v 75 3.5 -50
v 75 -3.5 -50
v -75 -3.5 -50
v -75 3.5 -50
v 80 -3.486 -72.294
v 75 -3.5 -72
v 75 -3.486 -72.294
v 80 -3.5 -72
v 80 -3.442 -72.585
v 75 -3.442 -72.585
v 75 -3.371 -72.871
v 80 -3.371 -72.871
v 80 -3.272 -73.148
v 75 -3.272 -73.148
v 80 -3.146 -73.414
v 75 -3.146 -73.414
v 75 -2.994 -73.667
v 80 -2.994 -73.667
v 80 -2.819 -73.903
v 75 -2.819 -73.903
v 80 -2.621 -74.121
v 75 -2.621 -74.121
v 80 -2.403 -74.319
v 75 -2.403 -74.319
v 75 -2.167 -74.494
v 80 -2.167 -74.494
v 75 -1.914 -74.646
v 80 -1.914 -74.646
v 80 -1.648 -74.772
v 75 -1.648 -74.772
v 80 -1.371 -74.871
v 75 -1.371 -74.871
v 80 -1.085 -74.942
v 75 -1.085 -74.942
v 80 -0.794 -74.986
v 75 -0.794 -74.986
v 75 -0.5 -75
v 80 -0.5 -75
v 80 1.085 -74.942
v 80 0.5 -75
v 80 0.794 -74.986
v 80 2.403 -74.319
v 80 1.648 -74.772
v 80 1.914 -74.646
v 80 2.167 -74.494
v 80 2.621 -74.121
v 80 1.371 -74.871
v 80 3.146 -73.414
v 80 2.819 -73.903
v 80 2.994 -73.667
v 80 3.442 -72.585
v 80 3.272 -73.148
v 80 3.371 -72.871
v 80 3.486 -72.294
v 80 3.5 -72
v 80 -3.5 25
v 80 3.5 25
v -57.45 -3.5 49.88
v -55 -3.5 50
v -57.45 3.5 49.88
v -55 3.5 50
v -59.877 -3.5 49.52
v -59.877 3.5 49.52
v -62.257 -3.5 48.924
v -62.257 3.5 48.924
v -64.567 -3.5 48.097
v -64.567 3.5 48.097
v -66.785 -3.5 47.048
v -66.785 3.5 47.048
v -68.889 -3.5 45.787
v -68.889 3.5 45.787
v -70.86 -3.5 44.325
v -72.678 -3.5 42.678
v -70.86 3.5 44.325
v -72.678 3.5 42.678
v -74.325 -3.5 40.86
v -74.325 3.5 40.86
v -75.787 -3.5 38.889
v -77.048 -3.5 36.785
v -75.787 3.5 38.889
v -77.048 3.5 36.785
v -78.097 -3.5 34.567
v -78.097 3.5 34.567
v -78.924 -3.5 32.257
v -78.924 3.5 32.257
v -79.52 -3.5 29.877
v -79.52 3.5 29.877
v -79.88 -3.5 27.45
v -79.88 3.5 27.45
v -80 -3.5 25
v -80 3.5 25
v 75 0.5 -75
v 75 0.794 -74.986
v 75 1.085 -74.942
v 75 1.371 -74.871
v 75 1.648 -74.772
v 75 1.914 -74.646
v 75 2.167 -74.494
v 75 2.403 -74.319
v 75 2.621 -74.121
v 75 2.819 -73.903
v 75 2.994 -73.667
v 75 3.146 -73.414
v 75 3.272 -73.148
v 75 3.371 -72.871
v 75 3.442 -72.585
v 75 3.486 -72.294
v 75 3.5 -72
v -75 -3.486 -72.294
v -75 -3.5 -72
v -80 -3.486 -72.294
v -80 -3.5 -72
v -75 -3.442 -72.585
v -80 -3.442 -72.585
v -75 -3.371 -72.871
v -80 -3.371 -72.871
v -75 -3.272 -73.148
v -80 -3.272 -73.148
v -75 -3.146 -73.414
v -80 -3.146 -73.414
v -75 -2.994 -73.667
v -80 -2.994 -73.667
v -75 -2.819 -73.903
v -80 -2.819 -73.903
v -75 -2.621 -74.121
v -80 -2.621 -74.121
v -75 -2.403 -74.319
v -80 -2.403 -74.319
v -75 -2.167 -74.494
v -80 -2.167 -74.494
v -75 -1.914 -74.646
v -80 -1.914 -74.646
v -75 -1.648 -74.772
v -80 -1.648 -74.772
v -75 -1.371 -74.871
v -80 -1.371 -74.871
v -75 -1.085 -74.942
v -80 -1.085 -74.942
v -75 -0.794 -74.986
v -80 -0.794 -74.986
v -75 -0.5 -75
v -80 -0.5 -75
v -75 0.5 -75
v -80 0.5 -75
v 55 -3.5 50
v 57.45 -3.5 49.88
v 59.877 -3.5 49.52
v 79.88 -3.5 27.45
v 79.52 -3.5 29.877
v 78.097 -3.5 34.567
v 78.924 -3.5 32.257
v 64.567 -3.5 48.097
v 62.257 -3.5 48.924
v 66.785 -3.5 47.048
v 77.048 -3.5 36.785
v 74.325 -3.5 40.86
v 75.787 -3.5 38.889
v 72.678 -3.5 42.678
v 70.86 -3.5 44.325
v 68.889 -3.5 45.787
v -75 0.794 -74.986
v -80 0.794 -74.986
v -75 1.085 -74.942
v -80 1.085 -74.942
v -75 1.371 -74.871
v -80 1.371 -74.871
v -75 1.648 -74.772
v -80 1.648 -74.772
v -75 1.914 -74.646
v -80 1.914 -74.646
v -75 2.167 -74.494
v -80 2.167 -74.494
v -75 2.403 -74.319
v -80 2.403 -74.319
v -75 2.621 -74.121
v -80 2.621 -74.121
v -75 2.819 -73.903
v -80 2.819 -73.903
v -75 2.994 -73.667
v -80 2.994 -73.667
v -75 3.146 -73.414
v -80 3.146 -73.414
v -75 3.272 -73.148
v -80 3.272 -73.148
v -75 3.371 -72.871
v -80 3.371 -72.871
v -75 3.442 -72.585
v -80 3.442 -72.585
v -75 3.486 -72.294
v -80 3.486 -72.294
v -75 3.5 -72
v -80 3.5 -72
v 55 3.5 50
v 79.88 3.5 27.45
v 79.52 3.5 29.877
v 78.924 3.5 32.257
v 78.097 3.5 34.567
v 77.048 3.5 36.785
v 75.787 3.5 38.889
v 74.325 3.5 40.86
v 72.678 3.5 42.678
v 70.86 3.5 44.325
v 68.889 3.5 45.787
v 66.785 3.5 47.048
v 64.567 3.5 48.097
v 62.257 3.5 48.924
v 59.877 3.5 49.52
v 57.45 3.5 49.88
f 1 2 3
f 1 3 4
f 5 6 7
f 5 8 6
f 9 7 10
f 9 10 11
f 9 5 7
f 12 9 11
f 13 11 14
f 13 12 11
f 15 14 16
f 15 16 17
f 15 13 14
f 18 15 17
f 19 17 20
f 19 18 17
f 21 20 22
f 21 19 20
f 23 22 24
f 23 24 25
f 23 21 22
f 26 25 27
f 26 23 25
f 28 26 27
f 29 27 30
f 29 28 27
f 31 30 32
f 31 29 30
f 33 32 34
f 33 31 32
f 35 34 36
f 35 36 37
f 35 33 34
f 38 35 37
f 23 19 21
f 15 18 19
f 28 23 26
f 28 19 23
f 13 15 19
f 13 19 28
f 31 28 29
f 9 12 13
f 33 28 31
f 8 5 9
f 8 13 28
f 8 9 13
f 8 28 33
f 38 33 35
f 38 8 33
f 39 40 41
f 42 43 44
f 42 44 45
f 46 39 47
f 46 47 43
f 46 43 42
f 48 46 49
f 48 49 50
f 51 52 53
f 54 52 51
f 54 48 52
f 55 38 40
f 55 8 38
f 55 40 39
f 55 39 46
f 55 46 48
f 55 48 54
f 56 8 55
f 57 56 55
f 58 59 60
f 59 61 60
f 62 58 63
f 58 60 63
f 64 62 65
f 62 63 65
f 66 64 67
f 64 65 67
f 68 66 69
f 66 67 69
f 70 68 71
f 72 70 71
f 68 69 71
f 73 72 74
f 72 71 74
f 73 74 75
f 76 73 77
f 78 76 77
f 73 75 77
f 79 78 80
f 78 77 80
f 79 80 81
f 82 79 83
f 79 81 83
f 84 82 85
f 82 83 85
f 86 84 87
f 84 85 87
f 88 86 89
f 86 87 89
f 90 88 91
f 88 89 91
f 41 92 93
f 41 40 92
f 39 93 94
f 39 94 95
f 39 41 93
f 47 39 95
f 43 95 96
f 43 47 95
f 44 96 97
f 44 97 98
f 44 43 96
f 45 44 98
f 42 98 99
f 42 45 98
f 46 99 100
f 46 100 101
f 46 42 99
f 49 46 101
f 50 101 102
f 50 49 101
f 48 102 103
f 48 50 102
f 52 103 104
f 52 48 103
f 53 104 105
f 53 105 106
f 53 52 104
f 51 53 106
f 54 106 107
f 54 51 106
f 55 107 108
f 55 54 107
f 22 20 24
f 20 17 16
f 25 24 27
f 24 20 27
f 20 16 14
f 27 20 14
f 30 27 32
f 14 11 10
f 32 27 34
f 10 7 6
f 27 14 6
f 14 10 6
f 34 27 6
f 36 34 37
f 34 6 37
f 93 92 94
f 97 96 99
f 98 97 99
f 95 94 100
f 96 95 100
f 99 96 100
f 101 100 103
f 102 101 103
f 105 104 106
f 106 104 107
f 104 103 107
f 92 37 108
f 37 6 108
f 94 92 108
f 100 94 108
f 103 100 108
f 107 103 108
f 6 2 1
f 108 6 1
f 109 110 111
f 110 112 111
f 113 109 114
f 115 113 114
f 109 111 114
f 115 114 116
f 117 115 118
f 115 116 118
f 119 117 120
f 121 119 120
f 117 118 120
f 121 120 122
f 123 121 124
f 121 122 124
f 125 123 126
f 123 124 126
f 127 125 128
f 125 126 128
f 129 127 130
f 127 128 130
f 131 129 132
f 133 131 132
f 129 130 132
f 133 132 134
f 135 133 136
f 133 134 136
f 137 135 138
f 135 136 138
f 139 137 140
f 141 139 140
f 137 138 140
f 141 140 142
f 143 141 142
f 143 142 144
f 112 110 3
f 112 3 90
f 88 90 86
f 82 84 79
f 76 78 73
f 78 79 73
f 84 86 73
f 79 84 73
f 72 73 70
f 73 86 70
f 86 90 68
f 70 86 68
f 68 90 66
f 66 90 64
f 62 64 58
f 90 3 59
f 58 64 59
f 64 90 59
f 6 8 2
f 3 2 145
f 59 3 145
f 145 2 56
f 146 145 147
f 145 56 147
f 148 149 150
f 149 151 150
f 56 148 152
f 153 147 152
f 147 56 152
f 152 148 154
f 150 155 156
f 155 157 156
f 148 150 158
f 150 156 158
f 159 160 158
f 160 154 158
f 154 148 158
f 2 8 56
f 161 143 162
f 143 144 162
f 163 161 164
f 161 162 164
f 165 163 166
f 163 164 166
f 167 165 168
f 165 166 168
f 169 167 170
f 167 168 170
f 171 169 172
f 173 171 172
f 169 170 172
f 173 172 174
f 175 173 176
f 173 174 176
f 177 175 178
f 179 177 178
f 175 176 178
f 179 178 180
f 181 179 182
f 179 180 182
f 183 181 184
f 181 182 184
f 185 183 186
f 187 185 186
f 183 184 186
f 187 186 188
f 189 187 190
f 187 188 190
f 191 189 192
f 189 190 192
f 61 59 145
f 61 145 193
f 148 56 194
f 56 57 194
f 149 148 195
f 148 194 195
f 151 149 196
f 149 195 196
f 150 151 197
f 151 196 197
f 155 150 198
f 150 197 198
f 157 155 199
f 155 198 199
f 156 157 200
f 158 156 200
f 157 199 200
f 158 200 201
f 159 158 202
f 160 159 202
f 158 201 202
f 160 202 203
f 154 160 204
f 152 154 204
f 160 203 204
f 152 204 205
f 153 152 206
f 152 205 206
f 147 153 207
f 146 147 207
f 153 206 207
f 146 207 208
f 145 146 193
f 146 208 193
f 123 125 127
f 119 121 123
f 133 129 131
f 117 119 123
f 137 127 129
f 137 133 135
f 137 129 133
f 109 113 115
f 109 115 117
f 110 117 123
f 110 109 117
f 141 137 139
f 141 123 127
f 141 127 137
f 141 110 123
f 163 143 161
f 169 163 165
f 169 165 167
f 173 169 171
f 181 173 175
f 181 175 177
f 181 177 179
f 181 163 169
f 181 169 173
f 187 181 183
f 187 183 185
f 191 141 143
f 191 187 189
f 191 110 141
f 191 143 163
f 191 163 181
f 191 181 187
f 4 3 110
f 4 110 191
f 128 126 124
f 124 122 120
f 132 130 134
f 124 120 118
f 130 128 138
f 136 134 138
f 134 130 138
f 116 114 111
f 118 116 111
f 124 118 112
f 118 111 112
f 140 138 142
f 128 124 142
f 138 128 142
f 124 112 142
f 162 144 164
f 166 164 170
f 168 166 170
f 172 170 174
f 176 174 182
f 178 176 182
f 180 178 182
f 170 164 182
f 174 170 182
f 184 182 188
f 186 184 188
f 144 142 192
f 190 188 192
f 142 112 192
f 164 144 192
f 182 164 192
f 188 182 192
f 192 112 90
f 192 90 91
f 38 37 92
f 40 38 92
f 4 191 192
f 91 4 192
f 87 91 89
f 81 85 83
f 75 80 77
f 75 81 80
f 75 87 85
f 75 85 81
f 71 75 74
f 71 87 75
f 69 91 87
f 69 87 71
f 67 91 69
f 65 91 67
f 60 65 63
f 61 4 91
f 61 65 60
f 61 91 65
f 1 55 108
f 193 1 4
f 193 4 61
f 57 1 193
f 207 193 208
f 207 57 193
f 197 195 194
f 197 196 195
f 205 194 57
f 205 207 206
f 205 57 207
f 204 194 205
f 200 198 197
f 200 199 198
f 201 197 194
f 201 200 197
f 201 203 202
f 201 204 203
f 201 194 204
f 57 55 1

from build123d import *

# Parameters (mm, degrees)
F0_W          = 7
F0_H          = 100
F1_DEPTH      = 75
F1_DEPTH_BACK = 75
F2_W          = 7
F2_H          = 125
F3_DEPTH      = 5
F5_R          = 25
F6_R          = 3


with BuildPart() as f1:
    # F0 (on Right) → F1 (new body, two sides)
    with BuildSketch(Plane.YZ) as f1_sk:
        Rectangle(F0_W, F0_H)
    extrude(amount=F1_DEPTH)
    extrude(f1_sk.sketch, amount=-F1_DEPTH_BACK)

    # F2 (on face) → F3 (join)
    with BuildSketch(Plane.YZ.offset(75)):
        with Locations((0, -12.5)):
            Rectangle(F2_W, F2_H)
    extrude(amount=F3_DEPTH)

    # F4: F1 across plane


with BuildPart() as f1_1:
    add(f1.part)
    add(f1.part.mirror(Plane.YZ))

    # F5
    f5_edges = [f1_1.edges().sort_by_distance(p)[0] for p in [
        (-80, 0, 50),
        (80, 0, 50),
    ]]
    fillet(f5_edges, radius=F5_R)

    # F6
    f6_edges = [f1_1.edges().sort_by_distance(p)[0] for p in [
        (-77.5, -3.5, -75),
        (77.5, -3.5, -75),
        (-77.5, 3.5, -75),
        (77.5, 3.5, -75),
    ]]
    fillet(f6_edges, radius=F6_R)


solid = f1_1.part
